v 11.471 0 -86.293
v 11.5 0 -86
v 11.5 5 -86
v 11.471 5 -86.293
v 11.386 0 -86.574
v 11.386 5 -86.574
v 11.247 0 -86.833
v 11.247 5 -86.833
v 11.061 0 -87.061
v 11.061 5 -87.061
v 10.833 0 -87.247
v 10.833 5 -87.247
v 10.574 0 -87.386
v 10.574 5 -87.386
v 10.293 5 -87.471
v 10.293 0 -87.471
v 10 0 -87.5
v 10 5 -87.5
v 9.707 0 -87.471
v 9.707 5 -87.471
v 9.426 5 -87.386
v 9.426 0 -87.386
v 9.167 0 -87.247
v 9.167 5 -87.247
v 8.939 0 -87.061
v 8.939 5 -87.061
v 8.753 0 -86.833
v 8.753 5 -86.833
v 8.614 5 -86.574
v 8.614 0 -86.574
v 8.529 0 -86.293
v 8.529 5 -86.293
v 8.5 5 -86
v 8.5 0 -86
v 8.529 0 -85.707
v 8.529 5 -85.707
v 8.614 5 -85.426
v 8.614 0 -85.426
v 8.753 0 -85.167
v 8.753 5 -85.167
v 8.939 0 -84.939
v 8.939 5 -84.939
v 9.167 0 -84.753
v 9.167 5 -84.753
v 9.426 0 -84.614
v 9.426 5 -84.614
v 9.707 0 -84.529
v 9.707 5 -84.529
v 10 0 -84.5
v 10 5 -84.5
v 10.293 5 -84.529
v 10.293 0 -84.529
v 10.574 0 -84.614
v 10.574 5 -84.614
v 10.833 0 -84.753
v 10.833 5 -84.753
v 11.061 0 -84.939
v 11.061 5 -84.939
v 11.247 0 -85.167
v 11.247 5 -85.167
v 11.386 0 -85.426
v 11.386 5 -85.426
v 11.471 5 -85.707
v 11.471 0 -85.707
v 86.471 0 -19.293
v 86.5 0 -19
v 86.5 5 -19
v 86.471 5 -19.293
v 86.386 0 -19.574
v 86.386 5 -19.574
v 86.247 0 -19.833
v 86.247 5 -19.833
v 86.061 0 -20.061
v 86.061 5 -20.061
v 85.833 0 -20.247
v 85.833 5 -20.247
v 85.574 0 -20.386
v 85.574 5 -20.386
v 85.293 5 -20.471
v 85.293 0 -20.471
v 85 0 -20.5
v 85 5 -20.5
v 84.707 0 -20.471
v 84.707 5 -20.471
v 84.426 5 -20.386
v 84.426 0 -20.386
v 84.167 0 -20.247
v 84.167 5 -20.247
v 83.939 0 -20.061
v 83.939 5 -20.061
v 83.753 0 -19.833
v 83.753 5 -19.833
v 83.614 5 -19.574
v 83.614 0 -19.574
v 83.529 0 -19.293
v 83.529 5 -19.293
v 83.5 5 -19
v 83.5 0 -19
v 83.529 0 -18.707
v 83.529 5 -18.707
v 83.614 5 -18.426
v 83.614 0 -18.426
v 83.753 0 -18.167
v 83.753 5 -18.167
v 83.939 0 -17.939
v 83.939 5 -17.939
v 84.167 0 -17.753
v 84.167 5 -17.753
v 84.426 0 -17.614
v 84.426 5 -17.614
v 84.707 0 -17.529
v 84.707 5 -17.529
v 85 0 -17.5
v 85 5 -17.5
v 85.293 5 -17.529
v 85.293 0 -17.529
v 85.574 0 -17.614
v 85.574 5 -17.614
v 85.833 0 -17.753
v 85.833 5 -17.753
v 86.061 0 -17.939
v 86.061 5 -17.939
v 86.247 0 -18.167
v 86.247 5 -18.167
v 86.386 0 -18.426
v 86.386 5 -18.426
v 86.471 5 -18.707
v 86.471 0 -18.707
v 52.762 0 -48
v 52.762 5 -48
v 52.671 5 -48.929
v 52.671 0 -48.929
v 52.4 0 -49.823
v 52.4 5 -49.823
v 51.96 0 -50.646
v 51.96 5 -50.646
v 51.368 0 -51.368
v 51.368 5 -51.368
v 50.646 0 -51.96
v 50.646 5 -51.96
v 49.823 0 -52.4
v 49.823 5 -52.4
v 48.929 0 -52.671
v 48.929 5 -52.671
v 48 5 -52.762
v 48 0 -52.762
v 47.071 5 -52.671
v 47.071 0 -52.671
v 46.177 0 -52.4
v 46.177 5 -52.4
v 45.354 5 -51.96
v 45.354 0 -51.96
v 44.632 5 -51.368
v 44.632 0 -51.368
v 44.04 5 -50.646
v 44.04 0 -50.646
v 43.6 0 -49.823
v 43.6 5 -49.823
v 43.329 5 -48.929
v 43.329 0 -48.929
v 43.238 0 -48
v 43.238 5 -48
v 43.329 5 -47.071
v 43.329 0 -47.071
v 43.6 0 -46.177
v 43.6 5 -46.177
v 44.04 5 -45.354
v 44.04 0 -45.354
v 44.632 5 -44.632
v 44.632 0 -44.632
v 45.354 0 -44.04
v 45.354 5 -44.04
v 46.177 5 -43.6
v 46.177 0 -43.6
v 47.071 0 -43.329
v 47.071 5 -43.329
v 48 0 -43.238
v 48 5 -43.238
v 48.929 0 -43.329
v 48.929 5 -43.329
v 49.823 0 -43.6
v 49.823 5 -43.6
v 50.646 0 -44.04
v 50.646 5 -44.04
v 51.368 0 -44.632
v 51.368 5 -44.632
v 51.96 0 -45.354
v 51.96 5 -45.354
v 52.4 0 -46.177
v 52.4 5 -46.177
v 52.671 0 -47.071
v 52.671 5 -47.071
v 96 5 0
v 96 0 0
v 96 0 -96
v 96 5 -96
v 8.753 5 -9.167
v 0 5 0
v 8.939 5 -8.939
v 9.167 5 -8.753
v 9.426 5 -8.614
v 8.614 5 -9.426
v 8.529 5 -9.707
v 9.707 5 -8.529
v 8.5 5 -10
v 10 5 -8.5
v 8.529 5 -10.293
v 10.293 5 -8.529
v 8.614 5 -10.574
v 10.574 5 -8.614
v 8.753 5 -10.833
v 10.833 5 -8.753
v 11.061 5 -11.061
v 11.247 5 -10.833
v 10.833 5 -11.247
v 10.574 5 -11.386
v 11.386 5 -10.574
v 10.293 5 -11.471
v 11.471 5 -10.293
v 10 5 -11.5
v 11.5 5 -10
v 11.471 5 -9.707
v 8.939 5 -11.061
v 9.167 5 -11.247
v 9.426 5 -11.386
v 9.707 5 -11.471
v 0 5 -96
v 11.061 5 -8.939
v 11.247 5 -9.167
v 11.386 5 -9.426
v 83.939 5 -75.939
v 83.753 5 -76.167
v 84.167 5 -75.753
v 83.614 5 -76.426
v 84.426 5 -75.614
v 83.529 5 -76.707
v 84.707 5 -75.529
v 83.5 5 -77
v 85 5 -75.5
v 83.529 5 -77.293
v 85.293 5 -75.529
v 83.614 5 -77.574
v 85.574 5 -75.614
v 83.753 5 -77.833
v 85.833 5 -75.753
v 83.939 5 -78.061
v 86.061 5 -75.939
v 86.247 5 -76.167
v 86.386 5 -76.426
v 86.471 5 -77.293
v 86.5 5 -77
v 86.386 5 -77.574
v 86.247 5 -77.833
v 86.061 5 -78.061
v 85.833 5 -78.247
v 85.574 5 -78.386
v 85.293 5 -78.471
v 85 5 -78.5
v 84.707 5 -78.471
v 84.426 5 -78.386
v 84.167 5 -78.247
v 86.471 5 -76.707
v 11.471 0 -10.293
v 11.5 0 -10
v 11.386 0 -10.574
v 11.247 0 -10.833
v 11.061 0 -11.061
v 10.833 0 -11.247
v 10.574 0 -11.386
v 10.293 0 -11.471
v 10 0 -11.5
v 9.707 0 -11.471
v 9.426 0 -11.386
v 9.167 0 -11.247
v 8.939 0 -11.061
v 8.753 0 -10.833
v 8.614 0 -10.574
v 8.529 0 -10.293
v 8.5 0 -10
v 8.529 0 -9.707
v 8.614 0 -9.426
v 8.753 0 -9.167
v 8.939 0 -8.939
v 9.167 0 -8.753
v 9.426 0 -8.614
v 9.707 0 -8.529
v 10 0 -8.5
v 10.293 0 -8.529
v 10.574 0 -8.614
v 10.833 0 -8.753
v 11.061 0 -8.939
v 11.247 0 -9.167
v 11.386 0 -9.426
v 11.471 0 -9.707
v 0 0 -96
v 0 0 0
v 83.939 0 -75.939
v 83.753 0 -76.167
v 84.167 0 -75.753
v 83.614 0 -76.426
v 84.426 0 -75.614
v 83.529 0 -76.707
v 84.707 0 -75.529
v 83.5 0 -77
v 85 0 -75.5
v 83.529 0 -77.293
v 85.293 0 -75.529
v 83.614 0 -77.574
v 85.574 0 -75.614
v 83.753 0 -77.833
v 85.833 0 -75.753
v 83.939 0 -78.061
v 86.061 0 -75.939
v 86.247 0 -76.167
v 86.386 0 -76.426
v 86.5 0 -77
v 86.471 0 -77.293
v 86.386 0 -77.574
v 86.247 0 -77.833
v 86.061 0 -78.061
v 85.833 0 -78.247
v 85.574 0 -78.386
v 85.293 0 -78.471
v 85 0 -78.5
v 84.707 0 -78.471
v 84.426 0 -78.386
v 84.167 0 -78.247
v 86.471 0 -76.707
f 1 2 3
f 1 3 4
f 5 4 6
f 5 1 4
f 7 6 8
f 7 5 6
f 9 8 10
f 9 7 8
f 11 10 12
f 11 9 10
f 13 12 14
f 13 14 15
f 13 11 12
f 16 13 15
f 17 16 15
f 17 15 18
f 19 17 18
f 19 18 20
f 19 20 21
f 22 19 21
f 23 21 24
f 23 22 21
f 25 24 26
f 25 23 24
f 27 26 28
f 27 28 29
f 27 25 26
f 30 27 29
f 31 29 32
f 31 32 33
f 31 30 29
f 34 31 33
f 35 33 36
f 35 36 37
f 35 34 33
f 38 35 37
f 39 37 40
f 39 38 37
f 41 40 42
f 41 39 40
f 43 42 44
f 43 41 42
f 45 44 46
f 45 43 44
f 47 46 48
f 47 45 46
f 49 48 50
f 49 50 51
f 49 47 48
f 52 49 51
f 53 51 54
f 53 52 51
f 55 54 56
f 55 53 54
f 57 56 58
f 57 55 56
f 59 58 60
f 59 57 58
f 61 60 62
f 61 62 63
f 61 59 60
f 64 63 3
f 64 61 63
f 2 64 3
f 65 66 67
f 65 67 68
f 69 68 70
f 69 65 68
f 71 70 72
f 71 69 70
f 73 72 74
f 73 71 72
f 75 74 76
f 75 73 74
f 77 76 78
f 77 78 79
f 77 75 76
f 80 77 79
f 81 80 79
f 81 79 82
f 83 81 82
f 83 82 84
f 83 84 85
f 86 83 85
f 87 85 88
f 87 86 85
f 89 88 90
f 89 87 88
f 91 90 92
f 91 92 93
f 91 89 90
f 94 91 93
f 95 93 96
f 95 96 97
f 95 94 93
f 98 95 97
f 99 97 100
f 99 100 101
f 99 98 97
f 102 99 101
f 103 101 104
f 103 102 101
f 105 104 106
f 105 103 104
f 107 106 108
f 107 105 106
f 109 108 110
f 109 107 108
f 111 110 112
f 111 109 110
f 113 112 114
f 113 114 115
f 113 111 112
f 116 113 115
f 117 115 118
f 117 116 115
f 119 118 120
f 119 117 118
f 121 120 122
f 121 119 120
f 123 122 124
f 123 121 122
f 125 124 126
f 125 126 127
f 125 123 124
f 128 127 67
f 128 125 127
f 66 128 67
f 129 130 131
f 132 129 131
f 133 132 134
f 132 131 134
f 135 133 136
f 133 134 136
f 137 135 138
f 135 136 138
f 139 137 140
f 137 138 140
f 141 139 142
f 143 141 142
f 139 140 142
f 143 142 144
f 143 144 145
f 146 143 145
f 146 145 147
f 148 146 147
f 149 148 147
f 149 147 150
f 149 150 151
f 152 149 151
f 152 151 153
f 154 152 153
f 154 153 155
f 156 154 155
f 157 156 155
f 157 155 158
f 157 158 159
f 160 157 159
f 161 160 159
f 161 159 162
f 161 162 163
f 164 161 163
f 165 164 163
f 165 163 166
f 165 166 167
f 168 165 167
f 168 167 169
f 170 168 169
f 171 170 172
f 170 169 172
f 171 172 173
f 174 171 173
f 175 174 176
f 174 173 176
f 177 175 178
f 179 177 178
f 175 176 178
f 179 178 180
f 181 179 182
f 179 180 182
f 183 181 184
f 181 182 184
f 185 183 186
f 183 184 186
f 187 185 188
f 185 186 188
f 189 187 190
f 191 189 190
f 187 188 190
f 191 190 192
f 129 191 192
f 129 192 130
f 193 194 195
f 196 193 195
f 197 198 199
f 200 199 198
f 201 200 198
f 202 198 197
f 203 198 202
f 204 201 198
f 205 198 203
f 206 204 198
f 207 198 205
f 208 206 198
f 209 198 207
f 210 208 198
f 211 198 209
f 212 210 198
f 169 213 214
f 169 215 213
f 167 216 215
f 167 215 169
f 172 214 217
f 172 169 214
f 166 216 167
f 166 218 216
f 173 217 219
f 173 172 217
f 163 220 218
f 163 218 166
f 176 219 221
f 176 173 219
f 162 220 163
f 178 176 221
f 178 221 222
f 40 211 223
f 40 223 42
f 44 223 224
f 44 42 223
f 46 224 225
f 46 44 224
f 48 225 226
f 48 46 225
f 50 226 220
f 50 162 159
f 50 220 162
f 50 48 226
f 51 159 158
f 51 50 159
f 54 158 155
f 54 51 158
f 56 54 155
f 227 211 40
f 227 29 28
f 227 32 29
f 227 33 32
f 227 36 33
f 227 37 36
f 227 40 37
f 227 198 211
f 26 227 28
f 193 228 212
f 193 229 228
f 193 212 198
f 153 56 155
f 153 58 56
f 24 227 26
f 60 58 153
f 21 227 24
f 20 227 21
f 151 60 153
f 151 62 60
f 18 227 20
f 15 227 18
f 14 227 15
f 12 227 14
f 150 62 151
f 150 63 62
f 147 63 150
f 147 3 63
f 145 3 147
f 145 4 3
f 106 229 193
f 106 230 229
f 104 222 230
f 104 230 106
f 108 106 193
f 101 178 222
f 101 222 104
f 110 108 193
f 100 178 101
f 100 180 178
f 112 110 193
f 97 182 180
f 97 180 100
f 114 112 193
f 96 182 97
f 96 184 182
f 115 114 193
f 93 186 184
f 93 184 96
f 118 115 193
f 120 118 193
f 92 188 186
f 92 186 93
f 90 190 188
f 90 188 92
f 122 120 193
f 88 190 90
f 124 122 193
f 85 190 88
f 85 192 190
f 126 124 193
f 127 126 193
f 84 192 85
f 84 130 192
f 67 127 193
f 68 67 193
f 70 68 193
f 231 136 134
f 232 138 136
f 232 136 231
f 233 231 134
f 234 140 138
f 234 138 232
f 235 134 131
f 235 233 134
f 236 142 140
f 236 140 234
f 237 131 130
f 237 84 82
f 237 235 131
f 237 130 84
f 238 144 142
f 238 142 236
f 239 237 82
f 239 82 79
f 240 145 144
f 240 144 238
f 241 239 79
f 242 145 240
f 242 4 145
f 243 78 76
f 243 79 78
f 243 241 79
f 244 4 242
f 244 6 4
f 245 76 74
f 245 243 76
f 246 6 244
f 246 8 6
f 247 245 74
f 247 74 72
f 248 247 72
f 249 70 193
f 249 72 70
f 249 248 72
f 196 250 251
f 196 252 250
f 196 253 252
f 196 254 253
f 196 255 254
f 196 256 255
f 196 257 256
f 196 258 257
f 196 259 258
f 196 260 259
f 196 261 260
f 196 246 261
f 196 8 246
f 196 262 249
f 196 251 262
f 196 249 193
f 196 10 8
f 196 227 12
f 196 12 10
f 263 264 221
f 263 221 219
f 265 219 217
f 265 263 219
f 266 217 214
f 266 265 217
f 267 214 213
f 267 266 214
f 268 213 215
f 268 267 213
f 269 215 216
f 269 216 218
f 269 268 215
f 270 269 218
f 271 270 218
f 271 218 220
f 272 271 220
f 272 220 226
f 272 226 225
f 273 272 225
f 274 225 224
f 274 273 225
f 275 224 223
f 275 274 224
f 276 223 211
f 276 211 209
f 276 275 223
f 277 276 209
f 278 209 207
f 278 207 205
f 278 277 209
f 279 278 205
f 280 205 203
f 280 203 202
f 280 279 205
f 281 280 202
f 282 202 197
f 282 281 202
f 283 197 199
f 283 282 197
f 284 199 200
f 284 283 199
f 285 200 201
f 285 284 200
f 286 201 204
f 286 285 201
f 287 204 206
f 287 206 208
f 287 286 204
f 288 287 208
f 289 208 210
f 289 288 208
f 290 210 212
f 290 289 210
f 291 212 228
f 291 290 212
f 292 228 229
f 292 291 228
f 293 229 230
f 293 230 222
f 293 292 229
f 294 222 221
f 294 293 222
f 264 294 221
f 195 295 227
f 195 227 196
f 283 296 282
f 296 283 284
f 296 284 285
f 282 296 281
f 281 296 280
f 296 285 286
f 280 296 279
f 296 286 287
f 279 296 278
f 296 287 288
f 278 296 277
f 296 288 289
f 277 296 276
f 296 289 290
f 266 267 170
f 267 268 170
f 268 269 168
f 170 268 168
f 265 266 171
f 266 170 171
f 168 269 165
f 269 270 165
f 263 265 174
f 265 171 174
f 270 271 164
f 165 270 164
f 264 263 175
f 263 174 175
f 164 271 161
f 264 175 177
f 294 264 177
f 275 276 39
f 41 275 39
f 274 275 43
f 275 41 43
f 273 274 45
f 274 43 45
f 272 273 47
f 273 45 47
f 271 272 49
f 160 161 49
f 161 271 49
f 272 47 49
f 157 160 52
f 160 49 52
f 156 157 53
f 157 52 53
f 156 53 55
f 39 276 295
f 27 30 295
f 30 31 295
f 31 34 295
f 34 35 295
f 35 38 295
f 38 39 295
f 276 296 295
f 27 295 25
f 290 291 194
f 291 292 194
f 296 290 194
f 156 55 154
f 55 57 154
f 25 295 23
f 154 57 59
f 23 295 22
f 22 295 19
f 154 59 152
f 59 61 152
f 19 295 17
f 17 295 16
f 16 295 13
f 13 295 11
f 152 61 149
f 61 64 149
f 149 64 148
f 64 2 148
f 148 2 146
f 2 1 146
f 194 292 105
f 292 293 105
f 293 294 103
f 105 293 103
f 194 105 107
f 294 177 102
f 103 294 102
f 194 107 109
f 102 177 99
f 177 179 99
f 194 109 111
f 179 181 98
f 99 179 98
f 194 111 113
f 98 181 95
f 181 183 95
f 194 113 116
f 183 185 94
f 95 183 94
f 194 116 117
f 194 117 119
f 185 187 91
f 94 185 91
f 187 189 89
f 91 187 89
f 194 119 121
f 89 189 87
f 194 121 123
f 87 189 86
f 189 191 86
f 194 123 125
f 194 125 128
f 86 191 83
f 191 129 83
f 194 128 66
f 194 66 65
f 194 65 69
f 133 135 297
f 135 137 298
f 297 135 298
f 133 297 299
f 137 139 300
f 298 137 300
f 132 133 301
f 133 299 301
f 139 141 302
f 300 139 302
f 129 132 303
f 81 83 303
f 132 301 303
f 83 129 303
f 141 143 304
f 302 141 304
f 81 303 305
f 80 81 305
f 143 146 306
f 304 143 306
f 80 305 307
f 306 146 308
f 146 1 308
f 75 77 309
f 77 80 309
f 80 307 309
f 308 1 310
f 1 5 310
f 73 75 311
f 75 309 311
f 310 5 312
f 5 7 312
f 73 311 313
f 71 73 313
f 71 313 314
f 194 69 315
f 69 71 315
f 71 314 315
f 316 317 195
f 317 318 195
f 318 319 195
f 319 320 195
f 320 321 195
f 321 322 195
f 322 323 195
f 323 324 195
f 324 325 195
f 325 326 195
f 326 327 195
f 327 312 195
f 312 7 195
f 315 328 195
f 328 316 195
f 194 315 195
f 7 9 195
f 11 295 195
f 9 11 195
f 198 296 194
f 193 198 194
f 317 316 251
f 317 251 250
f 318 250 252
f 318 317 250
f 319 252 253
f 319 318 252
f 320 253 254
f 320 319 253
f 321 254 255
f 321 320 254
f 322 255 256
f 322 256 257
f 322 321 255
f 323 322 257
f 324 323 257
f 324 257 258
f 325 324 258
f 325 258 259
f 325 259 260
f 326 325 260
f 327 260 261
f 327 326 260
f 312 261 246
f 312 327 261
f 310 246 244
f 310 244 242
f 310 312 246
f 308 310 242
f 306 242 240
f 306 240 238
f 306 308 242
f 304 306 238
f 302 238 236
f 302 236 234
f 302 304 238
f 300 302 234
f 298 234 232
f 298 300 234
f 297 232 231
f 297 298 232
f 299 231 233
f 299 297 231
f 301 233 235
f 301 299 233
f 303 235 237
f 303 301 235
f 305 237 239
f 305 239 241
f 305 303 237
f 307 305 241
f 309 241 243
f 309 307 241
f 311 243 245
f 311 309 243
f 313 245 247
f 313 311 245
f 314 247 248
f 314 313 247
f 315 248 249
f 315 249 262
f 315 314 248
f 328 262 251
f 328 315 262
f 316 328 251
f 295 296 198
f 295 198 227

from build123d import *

# Parameters (mm, degrees)
SKETCH1_W           = 96
SKETCH1_H           = 96
SKETCH1_R           = 1.5
BOSS_EXTRUDE1_DEPTH = 5
SKETCH2_R           = 4.7625
CUT_EXTRUDE1_DEPTH  = 6


with BuildPart() as part:
    # Sketch1 → Boss-Extrude1 (new body)
    with BuildSketch(Plane(origin=(0, 0, 0), x_dir=(1, 0, 0), z_dir=(0, 1, 0))):
        with Locations((48, 48)):
            Rectangle(SKETCH1_W, SKETCH1_H)
        with Locations((10, 10)):
            Circle(SKETCH1_R, mode=Mode.SUBTRACT)
        with Locations((85, 19)):
            Circle(SKETCH1_R, mode=Mode.SUBTRACT)
        with Locations((85, 77)):
            Circle(SKETCH1_R, mode=Mode.SUBTRACT)
        with Locations((10, 86)):
            Circle(SKETCH1_R, mode=Mode.SUBTRACT)
    extrude(amount=BOSS_EXTRUDE1_DEPTH)

    # Sketch2 → Cut-Extrude1 (cut, through all)
    with BuildSketch(Plane(origin=(0, 5, 0), x_dir=(1, 0, 0), z_dir=(0, 1, 0))):
        with Locations((48, 48)):
            Circle(SKETCH2_R)
    extrude(amount=-CUT_EXTRUDE1_DEPTH, mode=Mode.SUBTRACT)


solid = part.part
